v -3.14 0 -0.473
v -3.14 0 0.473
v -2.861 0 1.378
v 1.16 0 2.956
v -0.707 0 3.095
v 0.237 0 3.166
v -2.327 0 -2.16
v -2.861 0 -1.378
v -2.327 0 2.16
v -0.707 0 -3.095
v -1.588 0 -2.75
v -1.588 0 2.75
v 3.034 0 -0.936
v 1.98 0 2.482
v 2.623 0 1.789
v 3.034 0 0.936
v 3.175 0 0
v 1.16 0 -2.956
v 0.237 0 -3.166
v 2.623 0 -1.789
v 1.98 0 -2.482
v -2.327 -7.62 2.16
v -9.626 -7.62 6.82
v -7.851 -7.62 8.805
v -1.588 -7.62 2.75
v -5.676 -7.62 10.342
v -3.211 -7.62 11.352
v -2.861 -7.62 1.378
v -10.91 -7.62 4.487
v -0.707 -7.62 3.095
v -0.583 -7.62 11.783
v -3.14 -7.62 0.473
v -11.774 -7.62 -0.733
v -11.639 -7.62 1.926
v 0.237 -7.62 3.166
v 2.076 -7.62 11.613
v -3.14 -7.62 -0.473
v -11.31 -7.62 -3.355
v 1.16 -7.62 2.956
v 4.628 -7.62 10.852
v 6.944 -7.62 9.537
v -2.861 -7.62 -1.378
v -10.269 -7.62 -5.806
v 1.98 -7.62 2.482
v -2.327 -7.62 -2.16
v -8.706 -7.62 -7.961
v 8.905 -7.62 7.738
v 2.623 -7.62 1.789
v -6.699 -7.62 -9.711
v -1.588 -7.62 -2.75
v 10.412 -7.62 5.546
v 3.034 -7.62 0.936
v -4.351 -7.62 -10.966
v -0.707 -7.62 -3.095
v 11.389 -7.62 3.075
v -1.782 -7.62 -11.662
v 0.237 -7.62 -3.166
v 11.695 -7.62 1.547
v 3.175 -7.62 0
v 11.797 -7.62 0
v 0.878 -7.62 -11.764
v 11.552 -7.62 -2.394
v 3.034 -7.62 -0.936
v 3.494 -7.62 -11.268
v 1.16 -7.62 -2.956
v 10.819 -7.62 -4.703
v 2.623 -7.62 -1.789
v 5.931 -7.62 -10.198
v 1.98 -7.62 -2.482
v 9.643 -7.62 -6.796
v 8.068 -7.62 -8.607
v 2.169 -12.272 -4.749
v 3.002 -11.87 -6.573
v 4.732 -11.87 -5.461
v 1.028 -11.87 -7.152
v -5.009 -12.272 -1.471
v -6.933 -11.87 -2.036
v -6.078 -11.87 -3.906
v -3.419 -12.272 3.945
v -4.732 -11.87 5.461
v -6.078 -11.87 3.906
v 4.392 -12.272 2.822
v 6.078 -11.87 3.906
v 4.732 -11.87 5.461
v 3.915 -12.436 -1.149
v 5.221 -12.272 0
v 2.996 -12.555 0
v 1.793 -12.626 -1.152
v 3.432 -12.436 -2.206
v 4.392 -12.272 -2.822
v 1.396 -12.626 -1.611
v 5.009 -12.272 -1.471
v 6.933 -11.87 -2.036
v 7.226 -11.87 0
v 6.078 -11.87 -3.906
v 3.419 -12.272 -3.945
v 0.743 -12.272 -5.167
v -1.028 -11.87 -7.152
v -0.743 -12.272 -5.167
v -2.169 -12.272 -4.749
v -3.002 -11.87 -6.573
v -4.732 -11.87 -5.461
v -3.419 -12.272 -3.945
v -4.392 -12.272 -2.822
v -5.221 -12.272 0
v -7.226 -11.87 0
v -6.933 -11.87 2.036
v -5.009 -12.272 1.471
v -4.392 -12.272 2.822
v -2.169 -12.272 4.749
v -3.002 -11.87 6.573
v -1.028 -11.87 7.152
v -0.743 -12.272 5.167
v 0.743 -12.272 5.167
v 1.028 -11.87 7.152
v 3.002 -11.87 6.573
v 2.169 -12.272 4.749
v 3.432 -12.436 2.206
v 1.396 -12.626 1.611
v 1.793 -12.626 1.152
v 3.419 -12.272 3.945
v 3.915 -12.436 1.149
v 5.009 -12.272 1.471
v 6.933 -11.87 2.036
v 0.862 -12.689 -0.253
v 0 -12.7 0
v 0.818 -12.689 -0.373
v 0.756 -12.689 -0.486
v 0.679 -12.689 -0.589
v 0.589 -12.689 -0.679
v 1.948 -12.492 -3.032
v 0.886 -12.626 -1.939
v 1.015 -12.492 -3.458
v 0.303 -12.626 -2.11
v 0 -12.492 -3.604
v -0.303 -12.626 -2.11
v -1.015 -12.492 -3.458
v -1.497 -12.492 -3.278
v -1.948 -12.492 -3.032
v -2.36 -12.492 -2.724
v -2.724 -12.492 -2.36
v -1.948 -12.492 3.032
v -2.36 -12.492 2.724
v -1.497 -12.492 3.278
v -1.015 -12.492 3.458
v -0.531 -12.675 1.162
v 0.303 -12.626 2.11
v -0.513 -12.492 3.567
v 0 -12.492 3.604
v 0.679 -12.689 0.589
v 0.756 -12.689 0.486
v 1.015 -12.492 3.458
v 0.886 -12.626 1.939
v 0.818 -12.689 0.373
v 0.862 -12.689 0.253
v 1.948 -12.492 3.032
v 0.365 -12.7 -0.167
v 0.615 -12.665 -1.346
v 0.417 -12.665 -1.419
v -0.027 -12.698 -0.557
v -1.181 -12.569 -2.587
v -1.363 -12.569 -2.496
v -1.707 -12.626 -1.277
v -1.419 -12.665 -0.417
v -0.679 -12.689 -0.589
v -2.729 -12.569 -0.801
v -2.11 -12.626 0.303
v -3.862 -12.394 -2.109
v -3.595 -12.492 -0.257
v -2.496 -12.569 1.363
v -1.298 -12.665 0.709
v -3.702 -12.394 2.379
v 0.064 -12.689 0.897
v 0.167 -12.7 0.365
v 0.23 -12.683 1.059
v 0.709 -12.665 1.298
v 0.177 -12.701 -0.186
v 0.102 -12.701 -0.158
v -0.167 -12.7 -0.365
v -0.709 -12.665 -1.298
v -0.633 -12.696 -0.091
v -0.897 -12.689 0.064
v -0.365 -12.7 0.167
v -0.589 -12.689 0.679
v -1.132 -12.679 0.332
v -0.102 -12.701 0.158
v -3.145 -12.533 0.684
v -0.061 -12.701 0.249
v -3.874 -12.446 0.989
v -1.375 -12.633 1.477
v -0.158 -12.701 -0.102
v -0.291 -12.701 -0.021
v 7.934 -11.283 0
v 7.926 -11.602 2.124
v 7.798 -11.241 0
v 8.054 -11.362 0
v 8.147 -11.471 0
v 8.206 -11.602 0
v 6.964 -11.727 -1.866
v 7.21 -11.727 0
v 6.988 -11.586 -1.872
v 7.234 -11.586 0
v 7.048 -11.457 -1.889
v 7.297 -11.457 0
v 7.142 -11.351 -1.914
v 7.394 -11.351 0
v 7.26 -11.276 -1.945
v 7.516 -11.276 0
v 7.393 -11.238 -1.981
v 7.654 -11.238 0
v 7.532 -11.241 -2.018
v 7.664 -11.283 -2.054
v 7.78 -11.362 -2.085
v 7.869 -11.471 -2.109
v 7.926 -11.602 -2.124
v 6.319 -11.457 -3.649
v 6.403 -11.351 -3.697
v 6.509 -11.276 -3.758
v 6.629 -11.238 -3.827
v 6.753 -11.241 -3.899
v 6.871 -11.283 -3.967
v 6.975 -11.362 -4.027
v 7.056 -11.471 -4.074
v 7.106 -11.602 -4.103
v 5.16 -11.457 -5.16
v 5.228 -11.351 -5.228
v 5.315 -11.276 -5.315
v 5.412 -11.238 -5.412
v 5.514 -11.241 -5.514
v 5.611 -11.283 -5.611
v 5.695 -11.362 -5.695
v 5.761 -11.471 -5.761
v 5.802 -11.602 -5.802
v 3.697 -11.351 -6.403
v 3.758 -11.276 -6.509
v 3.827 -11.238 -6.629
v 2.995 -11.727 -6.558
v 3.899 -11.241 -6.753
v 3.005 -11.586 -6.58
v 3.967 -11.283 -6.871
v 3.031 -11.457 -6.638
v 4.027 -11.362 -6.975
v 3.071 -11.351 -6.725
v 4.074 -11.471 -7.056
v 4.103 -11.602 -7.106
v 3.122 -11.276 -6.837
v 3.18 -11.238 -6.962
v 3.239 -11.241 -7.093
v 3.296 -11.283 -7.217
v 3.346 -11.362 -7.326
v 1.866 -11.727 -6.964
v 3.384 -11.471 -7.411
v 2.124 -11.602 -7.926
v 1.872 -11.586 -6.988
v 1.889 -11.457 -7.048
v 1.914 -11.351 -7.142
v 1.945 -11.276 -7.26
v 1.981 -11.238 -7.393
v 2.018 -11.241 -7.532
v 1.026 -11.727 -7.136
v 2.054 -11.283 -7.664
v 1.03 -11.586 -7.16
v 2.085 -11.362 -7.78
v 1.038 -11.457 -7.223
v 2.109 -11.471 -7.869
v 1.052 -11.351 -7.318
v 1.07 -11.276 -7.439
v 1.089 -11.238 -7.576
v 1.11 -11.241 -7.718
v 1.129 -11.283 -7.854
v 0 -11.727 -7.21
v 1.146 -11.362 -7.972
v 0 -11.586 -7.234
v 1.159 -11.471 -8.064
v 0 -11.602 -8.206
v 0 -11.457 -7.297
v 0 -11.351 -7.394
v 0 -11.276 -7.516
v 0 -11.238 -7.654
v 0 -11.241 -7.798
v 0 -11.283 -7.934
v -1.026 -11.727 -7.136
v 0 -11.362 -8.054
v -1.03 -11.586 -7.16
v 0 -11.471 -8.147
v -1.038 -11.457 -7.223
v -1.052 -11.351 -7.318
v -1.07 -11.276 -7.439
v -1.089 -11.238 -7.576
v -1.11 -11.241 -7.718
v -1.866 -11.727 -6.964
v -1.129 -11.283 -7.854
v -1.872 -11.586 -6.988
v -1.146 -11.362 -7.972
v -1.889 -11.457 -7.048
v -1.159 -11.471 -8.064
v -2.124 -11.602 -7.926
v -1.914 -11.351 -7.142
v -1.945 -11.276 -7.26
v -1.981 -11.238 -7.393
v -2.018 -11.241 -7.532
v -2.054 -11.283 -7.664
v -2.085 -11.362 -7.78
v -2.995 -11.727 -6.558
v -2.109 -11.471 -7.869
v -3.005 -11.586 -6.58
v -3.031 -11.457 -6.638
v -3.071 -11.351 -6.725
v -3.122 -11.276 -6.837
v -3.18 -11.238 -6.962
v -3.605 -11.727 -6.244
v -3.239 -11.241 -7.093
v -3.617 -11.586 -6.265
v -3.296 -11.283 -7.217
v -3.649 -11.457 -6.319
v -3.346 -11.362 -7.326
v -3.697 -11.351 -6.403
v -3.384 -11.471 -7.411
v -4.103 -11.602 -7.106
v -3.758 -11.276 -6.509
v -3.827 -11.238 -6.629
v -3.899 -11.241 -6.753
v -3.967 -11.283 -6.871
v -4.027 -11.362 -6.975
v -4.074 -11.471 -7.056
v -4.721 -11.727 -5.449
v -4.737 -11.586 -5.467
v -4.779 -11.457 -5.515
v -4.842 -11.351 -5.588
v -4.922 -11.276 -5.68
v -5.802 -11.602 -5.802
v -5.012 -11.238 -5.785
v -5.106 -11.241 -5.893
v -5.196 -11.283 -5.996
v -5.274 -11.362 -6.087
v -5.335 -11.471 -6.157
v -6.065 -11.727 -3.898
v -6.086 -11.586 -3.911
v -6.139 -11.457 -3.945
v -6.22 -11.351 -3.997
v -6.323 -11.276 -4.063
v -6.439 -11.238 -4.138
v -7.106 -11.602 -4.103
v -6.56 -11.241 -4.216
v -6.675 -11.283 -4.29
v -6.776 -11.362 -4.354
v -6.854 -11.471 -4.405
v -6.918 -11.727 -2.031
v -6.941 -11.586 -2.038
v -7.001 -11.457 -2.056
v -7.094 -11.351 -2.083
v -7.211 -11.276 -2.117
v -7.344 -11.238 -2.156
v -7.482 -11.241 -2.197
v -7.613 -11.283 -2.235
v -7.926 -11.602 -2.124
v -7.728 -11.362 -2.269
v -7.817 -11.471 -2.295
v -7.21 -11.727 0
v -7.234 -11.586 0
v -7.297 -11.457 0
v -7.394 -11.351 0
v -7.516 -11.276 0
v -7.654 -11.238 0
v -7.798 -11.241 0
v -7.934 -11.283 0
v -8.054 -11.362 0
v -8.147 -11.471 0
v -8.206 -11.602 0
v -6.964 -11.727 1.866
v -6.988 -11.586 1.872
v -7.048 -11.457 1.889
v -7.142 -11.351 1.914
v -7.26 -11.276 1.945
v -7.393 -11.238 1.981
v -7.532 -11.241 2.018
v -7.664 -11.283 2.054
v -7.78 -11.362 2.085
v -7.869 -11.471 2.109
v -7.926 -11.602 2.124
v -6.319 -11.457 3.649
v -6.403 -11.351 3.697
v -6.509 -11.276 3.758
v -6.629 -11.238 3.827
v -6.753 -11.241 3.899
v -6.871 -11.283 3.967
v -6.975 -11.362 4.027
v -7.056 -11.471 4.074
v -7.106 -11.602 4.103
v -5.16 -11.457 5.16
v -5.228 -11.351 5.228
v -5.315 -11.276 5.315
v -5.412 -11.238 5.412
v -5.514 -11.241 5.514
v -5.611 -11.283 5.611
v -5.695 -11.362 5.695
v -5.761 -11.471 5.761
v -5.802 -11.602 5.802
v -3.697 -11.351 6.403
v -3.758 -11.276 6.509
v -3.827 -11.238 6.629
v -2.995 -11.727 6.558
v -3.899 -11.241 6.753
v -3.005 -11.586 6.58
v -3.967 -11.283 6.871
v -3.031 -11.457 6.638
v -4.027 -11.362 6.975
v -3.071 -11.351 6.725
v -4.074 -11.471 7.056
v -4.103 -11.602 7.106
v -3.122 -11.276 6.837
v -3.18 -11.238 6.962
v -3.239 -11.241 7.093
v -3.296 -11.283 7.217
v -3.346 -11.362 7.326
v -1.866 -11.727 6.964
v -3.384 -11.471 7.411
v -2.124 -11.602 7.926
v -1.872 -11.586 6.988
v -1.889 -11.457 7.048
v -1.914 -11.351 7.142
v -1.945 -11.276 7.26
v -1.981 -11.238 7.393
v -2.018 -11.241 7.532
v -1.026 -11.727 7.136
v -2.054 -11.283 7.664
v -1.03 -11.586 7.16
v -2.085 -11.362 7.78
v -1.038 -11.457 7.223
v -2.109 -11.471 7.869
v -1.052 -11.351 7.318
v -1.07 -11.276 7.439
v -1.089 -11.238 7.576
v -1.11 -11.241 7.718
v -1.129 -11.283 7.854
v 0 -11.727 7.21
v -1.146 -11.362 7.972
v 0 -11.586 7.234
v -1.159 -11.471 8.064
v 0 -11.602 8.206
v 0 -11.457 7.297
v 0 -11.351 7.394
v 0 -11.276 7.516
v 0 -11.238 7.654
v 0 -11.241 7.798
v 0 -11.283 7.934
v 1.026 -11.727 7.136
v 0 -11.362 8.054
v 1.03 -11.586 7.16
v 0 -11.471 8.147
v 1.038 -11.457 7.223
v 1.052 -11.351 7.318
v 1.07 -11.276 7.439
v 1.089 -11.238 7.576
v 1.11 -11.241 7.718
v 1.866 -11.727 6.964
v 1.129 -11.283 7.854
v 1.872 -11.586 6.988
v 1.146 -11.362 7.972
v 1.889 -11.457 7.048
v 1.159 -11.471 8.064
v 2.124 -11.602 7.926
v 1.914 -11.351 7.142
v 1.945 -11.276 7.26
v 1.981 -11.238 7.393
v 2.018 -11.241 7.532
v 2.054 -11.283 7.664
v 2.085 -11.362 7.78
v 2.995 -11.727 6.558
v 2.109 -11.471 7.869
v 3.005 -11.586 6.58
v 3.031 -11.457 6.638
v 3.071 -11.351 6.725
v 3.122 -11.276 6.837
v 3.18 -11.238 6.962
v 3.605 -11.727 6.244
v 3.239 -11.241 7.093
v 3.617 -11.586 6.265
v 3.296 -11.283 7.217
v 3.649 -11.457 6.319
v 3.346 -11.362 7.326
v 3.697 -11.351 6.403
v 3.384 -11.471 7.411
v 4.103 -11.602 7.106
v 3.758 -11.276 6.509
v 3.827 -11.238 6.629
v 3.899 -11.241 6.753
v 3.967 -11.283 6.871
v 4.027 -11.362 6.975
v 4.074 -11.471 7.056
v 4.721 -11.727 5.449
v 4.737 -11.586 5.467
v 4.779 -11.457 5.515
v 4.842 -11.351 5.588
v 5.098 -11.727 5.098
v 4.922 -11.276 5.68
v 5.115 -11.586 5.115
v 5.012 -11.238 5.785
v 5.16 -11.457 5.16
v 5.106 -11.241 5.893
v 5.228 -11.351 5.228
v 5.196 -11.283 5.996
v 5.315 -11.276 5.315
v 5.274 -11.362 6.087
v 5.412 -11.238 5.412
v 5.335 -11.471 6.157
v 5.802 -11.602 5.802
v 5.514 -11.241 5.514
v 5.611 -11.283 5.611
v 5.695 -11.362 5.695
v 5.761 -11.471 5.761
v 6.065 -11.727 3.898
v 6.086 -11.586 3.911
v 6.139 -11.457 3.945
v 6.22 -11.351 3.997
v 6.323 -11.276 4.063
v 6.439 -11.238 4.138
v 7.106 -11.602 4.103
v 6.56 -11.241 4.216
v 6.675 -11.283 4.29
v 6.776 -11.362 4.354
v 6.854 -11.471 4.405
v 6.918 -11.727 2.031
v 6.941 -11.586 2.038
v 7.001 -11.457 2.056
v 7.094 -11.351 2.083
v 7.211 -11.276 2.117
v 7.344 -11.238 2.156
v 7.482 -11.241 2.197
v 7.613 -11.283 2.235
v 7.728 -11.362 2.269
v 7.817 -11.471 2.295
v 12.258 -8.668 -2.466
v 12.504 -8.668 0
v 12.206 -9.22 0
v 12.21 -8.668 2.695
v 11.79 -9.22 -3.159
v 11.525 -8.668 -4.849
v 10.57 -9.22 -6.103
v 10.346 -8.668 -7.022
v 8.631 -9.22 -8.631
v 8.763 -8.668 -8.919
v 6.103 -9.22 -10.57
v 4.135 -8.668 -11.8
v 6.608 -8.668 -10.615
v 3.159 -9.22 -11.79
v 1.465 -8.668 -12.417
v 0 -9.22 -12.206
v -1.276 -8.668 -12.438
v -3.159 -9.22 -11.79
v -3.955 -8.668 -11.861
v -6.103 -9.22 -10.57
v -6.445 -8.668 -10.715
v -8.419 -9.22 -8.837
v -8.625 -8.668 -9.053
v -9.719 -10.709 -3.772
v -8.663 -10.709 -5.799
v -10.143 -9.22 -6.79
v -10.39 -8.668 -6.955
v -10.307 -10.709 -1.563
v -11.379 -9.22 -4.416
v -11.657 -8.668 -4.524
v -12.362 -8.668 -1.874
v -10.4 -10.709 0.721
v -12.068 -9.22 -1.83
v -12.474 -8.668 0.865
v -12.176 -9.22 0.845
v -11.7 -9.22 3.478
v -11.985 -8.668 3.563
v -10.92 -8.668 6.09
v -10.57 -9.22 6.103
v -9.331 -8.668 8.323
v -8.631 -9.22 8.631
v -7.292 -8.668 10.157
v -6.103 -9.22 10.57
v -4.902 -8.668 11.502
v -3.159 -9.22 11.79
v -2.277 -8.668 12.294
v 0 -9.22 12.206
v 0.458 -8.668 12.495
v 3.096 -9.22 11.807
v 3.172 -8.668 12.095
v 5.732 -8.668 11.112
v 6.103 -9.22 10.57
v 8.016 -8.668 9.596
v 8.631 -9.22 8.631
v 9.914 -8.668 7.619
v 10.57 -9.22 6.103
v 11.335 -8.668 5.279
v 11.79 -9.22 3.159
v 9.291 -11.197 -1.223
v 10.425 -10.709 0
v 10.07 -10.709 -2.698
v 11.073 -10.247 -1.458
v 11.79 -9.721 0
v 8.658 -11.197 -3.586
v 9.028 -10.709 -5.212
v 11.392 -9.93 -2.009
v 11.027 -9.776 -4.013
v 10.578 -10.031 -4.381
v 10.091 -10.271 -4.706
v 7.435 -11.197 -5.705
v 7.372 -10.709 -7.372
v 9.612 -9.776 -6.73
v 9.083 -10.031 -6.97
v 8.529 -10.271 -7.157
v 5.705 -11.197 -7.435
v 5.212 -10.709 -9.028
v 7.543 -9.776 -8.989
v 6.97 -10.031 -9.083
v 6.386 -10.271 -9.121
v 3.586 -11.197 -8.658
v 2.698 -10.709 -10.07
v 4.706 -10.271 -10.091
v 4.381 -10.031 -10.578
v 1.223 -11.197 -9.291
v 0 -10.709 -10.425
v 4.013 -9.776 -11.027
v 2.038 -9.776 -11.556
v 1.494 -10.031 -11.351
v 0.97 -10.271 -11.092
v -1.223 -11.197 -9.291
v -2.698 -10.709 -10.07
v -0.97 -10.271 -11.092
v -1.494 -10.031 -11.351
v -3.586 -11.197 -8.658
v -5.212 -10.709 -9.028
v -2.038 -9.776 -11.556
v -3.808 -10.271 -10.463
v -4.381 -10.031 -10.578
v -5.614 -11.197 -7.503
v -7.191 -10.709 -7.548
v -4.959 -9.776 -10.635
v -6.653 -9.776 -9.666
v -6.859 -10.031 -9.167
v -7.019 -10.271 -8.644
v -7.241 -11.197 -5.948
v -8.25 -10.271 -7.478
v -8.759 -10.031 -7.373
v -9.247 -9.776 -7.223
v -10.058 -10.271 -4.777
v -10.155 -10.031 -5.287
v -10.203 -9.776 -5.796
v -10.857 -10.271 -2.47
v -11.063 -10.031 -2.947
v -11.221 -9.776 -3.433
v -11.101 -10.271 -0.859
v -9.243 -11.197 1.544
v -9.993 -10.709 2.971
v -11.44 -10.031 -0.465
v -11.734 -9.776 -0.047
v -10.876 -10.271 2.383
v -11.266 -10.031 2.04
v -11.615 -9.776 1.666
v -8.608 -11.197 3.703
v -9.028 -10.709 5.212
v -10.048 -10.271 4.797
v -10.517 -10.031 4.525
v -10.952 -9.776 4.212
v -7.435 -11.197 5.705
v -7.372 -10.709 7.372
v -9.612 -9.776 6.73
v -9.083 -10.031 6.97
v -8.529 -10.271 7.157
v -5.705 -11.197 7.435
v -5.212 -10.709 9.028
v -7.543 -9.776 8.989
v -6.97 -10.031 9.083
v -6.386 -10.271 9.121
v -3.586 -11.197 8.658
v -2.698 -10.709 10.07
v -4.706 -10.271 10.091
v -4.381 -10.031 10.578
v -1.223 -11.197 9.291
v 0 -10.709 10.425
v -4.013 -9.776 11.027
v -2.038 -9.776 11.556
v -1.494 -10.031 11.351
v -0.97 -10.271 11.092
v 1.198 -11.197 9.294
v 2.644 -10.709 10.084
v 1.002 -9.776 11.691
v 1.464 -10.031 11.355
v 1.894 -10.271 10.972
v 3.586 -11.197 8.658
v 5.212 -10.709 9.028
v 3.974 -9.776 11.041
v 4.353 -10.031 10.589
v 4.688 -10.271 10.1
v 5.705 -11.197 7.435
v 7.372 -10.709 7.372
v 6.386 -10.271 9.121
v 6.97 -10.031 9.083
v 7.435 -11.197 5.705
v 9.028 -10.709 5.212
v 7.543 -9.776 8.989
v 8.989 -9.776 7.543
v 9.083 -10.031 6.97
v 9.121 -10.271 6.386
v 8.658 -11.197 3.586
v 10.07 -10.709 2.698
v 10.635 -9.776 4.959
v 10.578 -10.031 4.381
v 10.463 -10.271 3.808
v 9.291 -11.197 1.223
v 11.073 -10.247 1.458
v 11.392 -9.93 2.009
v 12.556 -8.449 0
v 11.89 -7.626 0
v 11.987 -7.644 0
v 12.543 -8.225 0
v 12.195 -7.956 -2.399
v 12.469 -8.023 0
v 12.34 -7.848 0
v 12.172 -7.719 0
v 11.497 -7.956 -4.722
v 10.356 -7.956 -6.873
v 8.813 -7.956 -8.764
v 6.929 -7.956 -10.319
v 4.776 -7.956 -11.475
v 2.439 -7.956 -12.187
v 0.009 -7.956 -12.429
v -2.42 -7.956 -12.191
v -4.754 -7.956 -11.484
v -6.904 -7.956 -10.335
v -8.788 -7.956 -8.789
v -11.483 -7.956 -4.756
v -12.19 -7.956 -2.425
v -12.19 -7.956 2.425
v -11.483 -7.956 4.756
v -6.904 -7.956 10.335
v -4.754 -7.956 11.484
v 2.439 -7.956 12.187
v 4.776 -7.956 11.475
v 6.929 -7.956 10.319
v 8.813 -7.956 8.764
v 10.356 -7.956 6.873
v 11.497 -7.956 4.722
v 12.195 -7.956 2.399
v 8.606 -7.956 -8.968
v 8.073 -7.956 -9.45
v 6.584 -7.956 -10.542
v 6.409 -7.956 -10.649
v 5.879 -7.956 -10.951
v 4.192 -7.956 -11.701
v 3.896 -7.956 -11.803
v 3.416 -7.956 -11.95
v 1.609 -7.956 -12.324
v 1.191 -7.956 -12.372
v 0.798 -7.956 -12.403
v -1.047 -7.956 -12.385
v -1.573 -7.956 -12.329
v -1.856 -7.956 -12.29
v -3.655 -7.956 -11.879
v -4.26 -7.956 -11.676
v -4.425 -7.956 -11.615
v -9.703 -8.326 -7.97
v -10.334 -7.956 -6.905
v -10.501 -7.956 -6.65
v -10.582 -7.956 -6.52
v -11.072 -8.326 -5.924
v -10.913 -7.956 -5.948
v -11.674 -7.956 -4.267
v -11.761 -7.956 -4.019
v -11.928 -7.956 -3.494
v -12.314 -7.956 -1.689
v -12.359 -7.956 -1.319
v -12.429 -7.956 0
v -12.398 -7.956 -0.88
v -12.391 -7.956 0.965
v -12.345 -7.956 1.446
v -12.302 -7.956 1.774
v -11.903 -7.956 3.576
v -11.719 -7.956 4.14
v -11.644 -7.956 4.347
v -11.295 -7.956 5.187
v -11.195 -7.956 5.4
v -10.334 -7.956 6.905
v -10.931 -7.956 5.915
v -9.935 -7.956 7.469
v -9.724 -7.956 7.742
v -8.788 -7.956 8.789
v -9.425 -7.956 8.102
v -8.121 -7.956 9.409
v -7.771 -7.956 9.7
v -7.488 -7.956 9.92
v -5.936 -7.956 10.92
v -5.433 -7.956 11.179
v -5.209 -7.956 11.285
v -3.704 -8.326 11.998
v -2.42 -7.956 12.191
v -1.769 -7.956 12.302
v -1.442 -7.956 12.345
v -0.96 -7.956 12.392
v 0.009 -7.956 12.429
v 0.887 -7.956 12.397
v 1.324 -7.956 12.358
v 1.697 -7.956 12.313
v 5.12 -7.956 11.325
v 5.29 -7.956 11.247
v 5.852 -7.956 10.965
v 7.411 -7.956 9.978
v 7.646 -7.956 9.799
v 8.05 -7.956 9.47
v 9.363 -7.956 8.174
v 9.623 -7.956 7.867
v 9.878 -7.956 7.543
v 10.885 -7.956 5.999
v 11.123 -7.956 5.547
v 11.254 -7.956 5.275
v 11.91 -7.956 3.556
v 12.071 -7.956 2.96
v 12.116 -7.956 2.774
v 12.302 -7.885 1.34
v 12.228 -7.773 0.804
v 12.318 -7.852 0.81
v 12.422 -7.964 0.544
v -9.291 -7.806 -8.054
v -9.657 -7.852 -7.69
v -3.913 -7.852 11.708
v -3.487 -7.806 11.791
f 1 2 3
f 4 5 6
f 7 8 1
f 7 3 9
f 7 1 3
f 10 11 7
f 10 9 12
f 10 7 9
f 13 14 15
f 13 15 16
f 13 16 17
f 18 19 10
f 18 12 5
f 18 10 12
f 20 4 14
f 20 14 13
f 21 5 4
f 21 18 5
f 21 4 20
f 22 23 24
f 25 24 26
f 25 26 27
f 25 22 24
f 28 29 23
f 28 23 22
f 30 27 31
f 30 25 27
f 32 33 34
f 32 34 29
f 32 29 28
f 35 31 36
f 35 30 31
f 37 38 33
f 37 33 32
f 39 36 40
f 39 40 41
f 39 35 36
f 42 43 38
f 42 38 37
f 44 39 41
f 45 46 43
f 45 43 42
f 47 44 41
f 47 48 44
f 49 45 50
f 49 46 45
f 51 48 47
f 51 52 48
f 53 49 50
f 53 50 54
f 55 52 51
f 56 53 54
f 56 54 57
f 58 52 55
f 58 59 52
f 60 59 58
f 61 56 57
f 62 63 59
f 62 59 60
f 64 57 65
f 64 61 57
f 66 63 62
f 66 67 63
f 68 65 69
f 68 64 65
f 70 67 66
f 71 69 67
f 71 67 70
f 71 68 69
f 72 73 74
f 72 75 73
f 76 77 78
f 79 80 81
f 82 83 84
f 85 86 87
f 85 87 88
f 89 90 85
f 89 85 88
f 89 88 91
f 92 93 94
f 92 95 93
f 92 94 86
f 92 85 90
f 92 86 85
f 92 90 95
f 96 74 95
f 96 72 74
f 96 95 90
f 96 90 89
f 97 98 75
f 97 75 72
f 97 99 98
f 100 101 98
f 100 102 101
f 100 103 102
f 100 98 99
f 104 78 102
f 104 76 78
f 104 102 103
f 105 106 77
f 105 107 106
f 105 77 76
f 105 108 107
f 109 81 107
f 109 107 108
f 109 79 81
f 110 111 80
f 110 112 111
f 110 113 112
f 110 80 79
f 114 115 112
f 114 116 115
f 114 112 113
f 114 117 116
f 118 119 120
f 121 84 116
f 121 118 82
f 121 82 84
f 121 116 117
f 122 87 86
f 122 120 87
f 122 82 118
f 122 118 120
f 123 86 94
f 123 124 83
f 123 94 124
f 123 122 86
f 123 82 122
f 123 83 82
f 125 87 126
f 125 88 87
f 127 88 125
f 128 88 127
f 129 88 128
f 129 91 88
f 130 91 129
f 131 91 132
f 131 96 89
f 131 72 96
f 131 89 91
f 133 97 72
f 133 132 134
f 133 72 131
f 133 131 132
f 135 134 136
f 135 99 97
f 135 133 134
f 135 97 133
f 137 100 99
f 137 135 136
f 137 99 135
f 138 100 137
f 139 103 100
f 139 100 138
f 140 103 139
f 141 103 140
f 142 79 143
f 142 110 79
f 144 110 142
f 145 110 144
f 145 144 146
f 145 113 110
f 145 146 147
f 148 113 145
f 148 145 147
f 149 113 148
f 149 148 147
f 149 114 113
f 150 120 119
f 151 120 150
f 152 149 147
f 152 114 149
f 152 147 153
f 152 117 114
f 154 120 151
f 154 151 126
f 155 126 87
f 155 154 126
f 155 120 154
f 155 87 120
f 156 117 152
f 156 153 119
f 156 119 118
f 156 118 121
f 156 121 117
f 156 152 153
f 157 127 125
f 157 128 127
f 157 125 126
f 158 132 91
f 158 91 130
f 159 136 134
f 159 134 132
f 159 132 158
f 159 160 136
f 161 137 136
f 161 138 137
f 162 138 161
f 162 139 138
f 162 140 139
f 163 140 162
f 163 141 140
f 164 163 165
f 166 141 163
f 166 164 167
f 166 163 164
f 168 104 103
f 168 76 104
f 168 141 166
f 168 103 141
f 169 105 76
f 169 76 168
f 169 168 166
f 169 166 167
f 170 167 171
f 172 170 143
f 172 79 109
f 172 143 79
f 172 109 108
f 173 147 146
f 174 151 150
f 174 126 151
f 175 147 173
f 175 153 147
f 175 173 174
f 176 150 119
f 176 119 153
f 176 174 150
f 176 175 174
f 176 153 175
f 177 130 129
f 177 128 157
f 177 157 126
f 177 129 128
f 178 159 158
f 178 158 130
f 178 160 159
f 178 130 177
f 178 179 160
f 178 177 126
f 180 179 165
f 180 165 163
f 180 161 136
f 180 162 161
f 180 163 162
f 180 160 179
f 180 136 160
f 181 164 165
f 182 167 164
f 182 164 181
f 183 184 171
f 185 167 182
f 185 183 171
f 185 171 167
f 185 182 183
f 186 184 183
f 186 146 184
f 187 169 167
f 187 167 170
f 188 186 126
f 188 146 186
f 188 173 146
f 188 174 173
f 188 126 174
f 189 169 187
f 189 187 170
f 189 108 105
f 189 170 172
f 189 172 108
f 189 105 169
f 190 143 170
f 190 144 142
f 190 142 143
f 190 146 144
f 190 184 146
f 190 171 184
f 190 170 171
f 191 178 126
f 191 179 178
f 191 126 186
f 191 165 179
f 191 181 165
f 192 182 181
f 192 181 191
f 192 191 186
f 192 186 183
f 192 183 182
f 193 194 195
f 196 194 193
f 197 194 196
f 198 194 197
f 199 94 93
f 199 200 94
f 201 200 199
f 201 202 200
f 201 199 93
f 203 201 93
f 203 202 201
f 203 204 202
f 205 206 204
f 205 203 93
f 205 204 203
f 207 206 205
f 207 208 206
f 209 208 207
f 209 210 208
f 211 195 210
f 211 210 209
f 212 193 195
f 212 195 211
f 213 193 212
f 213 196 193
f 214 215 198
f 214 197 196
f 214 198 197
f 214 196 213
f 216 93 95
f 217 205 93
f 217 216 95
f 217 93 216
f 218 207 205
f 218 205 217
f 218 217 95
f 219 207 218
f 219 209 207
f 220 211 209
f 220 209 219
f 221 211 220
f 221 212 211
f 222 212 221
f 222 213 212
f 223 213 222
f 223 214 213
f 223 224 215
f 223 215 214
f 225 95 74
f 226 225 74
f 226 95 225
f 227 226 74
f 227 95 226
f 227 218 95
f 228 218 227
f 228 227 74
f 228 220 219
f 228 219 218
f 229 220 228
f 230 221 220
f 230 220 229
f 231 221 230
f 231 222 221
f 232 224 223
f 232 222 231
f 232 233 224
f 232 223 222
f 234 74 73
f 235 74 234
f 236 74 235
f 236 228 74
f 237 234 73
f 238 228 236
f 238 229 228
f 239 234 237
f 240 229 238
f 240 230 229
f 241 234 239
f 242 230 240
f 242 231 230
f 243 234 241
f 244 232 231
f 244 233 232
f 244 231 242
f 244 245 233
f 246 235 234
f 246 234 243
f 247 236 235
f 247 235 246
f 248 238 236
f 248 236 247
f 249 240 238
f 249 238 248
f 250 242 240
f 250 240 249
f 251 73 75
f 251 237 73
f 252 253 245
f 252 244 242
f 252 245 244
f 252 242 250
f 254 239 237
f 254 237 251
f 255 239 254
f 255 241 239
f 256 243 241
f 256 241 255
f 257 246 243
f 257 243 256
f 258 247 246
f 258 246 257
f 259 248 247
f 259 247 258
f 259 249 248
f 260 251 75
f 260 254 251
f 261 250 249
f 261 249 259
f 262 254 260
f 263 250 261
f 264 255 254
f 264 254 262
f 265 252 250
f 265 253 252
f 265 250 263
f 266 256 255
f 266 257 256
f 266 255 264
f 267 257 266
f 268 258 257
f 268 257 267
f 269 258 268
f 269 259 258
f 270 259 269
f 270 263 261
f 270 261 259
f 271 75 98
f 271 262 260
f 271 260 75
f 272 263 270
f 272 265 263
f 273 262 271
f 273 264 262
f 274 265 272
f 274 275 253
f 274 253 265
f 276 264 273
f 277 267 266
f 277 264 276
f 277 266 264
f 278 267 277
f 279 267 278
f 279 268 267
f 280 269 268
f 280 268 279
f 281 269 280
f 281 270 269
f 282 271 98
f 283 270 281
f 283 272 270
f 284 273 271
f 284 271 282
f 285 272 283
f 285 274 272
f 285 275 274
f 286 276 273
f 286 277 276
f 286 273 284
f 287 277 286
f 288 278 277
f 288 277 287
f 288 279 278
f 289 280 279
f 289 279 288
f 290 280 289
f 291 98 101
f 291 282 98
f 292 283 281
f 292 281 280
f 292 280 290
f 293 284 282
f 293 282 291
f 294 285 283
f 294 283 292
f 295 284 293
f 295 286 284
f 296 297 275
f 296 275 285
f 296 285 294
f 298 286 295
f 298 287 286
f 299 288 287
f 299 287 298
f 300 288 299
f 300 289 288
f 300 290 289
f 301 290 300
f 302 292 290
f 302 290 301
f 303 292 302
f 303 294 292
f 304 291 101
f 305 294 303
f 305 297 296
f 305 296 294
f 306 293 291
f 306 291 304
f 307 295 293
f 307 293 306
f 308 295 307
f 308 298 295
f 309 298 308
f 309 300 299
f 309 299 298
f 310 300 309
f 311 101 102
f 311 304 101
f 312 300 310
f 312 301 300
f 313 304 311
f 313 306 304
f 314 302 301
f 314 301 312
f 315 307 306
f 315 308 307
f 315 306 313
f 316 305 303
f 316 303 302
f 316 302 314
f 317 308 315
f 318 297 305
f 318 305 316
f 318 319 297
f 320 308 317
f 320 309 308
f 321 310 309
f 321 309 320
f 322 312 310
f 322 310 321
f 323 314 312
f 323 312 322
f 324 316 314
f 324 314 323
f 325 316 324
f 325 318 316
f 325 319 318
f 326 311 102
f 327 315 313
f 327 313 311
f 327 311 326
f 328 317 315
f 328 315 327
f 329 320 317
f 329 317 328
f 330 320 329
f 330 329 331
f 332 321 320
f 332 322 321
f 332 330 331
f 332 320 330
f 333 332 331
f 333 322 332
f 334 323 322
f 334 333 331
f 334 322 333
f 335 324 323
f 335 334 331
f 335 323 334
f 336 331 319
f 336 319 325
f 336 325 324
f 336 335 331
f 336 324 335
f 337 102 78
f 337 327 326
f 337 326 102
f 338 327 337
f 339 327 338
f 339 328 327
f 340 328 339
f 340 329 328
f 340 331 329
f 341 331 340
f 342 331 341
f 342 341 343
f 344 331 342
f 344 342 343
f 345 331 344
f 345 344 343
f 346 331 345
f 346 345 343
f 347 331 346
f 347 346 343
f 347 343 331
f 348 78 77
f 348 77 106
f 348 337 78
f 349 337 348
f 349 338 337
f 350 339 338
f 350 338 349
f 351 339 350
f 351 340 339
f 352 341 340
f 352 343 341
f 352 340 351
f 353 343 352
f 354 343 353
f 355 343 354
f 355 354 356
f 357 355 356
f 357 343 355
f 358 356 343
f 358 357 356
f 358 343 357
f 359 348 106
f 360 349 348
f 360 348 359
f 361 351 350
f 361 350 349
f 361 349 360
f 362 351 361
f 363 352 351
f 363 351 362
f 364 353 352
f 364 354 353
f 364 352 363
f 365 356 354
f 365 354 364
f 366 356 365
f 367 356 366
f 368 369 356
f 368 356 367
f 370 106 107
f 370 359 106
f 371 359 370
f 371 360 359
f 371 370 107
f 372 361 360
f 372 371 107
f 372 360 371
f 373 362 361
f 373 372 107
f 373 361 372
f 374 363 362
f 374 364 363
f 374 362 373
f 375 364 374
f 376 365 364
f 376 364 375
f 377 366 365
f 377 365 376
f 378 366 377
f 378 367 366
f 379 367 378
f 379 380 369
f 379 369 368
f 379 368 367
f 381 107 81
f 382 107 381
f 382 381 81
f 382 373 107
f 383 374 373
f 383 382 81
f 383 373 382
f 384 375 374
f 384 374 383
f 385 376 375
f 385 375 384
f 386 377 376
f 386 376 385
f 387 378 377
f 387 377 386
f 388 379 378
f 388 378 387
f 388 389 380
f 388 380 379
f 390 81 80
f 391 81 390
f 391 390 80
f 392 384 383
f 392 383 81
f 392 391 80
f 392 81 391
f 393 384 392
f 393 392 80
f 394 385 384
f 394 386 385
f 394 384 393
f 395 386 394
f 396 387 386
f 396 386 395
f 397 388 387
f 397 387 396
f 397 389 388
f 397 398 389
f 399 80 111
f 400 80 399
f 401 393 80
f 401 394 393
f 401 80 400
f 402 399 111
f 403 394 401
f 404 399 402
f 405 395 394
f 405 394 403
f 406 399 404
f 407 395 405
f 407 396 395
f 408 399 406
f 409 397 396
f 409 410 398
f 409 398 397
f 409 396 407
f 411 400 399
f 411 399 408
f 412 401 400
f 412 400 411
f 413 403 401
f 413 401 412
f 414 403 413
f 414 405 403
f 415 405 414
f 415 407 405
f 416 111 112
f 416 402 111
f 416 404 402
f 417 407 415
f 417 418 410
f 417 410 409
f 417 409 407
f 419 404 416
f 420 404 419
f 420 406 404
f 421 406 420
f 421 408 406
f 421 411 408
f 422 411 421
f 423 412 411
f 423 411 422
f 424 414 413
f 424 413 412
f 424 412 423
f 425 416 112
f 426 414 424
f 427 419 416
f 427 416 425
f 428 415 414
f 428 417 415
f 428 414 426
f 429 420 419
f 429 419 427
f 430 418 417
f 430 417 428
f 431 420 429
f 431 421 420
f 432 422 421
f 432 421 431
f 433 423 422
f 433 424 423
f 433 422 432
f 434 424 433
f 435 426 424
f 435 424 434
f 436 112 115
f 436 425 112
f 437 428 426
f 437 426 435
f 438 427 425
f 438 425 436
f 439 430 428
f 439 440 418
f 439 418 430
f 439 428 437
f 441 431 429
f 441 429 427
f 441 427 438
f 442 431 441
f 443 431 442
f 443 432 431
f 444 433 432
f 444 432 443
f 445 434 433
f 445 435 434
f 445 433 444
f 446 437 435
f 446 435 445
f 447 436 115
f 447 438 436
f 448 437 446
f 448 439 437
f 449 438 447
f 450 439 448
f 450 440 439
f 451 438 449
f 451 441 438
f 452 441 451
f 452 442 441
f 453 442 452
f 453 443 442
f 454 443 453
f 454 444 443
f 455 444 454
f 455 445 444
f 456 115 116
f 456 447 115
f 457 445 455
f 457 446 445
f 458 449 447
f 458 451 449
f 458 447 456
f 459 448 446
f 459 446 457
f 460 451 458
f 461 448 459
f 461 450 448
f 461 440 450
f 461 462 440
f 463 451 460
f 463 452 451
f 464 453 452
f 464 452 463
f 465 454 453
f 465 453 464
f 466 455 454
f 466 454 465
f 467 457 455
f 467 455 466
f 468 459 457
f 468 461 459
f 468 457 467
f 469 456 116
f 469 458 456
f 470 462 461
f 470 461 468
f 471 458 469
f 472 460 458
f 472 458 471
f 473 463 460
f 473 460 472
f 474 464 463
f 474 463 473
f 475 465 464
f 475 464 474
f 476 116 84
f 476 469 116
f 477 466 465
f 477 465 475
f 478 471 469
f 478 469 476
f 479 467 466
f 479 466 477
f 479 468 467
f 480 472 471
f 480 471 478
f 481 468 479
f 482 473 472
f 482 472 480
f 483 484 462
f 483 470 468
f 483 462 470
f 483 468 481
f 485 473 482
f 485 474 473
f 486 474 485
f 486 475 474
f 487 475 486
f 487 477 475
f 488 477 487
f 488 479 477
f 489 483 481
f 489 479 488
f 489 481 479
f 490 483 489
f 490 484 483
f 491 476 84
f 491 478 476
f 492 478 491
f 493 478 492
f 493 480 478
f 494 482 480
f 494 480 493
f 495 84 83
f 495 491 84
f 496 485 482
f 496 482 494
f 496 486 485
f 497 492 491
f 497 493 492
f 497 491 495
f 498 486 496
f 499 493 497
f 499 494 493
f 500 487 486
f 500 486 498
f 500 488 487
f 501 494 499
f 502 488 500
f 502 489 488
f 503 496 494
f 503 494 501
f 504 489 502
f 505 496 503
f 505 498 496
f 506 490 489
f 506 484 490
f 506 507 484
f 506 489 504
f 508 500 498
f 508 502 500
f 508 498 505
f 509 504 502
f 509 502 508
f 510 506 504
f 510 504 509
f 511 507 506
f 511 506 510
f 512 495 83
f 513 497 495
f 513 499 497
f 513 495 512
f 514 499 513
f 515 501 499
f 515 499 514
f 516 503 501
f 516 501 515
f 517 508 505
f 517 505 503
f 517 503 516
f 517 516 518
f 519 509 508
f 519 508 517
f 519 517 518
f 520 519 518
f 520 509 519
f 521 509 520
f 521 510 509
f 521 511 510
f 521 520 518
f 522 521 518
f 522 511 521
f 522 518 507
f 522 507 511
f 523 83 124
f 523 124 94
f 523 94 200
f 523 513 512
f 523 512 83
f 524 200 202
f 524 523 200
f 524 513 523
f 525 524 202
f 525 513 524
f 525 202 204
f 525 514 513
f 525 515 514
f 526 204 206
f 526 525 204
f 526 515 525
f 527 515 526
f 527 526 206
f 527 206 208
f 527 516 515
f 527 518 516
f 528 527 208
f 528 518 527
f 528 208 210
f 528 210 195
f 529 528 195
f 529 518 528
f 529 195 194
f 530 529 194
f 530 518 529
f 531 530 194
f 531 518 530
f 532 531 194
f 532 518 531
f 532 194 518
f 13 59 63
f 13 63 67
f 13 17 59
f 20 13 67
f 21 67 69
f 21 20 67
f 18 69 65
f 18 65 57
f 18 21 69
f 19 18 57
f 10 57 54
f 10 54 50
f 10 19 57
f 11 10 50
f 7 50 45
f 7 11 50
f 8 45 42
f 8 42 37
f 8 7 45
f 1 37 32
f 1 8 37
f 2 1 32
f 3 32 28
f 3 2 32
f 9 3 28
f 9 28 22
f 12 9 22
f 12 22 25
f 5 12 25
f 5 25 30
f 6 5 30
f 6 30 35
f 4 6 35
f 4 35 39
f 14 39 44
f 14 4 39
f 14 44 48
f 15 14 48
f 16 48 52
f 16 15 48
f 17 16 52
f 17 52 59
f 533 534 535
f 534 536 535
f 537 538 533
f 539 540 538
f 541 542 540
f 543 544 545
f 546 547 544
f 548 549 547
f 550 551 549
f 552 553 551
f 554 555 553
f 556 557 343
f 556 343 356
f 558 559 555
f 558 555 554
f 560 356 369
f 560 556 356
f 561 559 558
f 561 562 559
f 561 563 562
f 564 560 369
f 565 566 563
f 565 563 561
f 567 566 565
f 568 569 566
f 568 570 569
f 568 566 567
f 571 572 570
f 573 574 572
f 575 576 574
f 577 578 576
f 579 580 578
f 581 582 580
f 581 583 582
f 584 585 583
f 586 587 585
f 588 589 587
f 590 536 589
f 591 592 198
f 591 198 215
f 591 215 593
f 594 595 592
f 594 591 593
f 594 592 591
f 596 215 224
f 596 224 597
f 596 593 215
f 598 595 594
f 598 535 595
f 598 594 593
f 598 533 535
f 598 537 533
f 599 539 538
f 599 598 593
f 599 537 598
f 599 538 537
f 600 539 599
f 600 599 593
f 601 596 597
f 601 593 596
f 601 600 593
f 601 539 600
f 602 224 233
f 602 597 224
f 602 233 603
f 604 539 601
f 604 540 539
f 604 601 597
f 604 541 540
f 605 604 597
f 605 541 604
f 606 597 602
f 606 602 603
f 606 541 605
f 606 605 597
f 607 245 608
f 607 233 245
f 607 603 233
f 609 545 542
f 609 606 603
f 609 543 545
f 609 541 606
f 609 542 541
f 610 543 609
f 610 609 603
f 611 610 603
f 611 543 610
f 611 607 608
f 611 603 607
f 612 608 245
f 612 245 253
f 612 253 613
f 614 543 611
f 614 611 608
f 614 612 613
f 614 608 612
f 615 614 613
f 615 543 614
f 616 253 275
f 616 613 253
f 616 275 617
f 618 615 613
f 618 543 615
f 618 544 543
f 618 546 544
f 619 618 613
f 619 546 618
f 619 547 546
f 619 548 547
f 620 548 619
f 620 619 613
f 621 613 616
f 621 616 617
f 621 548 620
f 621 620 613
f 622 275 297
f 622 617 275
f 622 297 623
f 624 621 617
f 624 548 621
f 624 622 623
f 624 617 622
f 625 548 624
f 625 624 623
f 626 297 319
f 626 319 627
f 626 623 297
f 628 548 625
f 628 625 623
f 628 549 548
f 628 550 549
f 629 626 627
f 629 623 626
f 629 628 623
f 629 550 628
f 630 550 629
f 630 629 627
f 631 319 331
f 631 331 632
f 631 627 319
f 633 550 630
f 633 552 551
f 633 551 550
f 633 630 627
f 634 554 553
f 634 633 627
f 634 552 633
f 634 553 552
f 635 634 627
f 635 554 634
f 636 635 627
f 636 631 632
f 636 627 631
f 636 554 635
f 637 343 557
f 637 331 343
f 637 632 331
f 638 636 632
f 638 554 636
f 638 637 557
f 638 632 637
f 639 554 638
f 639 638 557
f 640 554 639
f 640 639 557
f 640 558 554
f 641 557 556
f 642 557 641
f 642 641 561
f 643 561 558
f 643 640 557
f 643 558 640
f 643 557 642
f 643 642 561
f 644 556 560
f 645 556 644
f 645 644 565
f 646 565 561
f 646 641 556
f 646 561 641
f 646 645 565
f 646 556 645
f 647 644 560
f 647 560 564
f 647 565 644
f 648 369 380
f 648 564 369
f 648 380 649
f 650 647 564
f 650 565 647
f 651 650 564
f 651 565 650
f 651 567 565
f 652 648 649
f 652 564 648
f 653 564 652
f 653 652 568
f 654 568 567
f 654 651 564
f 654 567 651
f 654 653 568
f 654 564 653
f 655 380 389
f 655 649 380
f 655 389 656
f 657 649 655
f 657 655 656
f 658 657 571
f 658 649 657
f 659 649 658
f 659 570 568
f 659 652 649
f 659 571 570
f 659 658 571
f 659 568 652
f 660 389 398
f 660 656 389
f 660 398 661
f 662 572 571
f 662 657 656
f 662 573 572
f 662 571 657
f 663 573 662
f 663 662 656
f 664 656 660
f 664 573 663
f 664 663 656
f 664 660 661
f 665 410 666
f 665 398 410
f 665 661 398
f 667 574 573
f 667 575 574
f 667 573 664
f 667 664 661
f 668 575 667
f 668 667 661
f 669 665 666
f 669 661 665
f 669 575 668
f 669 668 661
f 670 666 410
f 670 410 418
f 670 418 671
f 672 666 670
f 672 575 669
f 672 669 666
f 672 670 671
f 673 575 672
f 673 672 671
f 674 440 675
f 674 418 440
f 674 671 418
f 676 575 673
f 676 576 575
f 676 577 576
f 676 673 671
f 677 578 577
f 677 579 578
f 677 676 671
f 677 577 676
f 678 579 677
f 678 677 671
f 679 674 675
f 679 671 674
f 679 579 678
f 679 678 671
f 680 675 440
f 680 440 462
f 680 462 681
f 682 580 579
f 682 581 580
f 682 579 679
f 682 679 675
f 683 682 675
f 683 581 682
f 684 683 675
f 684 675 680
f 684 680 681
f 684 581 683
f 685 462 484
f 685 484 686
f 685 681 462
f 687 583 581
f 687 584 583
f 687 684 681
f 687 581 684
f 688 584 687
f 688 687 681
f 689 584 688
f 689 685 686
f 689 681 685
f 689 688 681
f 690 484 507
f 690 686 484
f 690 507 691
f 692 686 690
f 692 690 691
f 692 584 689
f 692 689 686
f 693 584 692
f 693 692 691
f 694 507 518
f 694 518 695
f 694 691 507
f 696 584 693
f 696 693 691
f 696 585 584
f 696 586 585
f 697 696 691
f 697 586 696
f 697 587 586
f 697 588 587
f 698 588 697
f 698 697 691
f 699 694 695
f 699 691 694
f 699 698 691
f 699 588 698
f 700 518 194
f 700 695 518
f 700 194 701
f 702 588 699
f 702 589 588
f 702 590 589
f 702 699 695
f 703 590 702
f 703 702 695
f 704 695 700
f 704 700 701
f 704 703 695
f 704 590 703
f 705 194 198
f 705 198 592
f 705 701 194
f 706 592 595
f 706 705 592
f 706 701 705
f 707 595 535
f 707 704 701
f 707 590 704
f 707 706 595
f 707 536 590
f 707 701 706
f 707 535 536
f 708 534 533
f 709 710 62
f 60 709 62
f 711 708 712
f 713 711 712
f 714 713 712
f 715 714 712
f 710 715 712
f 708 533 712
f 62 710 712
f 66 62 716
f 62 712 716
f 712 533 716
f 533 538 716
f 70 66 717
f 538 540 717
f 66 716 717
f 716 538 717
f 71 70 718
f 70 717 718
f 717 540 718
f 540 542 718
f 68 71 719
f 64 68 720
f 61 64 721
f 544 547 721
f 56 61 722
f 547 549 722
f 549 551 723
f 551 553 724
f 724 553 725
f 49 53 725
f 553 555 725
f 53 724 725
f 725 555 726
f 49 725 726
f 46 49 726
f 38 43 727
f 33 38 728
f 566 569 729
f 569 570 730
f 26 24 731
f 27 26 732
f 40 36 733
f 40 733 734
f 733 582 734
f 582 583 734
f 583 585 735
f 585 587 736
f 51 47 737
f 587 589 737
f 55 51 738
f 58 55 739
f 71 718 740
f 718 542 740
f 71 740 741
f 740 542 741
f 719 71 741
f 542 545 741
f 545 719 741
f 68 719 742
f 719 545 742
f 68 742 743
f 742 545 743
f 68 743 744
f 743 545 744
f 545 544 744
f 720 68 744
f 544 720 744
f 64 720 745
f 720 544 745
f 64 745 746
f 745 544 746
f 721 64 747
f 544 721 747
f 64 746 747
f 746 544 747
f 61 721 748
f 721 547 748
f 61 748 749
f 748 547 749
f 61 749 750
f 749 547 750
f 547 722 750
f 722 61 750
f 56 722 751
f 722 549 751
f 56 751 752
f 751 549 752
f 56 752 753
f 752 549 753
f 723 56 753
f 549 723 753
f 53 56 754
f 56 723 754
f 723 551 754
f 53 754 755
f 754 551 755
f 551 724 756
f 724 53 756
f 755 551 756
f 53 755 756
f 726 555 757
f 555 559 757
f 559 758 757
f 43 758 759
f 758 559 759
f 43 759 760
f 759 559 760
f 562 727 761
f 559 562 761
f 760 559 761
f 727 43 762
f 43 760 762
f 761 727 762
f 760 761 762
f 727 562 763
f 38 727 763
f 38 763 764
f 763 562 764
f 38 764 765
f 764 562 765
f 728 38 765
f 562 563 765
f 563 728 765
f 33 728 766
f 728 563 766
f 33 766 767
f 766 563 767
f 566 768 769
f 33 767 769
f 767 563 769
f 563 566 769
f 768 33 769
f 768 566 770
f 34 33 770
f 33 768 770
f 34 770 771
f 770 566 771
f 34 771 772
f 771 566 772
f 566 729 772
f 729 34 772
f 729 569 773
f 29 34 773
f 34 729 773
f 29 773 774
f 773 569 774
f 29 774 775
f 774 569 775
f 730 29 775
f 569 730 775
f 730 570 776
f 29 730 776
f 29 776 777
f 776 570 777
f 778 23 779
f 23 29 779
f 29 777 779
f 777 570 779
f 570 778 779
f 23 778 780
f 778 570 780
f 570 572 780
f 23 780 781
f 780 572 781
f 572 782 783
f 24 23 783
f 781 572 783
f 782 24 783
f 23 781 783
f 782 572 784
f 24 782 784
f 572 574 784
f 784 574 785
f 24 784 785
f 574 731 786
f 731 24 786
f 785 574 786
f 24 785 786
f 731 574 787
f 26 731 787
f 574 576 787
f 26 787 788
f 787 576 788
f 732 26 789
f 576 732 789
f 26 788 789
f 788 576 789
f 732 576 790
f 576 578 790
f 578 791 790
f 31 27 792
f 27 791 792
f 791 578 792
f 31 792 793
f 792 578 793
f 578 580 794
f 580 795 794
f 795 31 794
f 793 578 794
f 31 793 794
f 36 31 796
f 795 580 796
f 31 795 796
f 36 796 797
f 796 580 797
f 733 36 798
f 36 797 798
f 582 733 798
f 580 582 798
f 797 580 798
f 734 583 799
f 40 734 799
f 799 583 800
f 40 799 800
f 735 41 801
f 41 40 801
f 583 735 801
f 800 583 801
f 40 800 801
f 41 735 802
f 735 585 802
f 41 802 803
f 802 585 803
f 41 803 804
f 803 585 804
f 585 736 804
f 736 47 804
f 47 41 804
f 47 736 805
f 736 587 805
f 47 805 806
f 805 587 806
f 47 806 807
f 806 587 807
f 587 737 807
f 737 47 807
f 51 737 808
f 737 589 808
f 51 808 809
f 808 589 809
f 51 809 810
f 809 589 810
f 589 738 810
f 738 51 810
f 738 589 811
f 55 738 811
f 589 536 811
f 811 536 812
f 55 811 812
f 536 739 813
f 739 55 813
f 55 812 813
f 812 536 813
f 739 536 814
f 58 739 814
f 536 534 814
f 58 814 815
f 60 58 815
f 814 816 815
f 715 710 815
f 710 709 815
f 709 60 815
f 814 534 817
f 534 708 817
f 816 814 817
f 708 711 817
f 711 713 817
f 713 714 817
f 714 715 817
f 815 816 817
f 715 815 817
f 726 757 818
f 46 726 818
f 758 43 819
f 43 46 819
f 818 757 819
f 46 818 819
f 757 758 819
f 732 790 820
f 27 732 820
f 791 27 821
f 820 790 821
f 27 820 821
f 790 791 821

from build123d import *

# Parameters (mm, degrees)
F2_R = 0.762


with BuildPart() as f1:
    # F0 (on Top) → F1 (revolve)
    with BuildSketch(Plane.XY):
        with BuildLine():
            Line((3.175, 0), (0, 0))
            Line((0, 0), (0, -12.7))
            add(Edge.make_bspline(
                [(0, -12.7), (1.214668, -12.717949), (4.366045, -12.571287), (7.2255, -11.869547)],
                knots=[0, 0, 0, 0, 6.793851, 6.793851, 6.793851, 6.793851], degree=3))
            ThreePointArc((7.2255, -11.869547), (7.583665, -11.252302), (8.205612, -11.602239))
            add(Edge.make_bspline(
                [(8.205612, -11.602239), (10.683699, -10.852261), (12.718533, -9.618881), (12.7, -7.62)],
                knots=[7.582171, 7.582171, 7.582171, 7.582171, 13.678319, 13.678319, 13.678319, 13.678319], degree=3))
            Line((12.7, -7.62), (3.175, -7.62))
            Line((3.175, -7.62), (3.175, 0))
        make_face()
    revolve(axis=Axis((0, -6.35, 0), (0, 1, 0)))

    # F2
    f2_edges = [f1.edges().sort_by_distance(p)[0] for p in [
        (-12.7, -7.62, 0),
    ]]
    fillet(f2_edges, radius=F2_R)


solid = f1.part
